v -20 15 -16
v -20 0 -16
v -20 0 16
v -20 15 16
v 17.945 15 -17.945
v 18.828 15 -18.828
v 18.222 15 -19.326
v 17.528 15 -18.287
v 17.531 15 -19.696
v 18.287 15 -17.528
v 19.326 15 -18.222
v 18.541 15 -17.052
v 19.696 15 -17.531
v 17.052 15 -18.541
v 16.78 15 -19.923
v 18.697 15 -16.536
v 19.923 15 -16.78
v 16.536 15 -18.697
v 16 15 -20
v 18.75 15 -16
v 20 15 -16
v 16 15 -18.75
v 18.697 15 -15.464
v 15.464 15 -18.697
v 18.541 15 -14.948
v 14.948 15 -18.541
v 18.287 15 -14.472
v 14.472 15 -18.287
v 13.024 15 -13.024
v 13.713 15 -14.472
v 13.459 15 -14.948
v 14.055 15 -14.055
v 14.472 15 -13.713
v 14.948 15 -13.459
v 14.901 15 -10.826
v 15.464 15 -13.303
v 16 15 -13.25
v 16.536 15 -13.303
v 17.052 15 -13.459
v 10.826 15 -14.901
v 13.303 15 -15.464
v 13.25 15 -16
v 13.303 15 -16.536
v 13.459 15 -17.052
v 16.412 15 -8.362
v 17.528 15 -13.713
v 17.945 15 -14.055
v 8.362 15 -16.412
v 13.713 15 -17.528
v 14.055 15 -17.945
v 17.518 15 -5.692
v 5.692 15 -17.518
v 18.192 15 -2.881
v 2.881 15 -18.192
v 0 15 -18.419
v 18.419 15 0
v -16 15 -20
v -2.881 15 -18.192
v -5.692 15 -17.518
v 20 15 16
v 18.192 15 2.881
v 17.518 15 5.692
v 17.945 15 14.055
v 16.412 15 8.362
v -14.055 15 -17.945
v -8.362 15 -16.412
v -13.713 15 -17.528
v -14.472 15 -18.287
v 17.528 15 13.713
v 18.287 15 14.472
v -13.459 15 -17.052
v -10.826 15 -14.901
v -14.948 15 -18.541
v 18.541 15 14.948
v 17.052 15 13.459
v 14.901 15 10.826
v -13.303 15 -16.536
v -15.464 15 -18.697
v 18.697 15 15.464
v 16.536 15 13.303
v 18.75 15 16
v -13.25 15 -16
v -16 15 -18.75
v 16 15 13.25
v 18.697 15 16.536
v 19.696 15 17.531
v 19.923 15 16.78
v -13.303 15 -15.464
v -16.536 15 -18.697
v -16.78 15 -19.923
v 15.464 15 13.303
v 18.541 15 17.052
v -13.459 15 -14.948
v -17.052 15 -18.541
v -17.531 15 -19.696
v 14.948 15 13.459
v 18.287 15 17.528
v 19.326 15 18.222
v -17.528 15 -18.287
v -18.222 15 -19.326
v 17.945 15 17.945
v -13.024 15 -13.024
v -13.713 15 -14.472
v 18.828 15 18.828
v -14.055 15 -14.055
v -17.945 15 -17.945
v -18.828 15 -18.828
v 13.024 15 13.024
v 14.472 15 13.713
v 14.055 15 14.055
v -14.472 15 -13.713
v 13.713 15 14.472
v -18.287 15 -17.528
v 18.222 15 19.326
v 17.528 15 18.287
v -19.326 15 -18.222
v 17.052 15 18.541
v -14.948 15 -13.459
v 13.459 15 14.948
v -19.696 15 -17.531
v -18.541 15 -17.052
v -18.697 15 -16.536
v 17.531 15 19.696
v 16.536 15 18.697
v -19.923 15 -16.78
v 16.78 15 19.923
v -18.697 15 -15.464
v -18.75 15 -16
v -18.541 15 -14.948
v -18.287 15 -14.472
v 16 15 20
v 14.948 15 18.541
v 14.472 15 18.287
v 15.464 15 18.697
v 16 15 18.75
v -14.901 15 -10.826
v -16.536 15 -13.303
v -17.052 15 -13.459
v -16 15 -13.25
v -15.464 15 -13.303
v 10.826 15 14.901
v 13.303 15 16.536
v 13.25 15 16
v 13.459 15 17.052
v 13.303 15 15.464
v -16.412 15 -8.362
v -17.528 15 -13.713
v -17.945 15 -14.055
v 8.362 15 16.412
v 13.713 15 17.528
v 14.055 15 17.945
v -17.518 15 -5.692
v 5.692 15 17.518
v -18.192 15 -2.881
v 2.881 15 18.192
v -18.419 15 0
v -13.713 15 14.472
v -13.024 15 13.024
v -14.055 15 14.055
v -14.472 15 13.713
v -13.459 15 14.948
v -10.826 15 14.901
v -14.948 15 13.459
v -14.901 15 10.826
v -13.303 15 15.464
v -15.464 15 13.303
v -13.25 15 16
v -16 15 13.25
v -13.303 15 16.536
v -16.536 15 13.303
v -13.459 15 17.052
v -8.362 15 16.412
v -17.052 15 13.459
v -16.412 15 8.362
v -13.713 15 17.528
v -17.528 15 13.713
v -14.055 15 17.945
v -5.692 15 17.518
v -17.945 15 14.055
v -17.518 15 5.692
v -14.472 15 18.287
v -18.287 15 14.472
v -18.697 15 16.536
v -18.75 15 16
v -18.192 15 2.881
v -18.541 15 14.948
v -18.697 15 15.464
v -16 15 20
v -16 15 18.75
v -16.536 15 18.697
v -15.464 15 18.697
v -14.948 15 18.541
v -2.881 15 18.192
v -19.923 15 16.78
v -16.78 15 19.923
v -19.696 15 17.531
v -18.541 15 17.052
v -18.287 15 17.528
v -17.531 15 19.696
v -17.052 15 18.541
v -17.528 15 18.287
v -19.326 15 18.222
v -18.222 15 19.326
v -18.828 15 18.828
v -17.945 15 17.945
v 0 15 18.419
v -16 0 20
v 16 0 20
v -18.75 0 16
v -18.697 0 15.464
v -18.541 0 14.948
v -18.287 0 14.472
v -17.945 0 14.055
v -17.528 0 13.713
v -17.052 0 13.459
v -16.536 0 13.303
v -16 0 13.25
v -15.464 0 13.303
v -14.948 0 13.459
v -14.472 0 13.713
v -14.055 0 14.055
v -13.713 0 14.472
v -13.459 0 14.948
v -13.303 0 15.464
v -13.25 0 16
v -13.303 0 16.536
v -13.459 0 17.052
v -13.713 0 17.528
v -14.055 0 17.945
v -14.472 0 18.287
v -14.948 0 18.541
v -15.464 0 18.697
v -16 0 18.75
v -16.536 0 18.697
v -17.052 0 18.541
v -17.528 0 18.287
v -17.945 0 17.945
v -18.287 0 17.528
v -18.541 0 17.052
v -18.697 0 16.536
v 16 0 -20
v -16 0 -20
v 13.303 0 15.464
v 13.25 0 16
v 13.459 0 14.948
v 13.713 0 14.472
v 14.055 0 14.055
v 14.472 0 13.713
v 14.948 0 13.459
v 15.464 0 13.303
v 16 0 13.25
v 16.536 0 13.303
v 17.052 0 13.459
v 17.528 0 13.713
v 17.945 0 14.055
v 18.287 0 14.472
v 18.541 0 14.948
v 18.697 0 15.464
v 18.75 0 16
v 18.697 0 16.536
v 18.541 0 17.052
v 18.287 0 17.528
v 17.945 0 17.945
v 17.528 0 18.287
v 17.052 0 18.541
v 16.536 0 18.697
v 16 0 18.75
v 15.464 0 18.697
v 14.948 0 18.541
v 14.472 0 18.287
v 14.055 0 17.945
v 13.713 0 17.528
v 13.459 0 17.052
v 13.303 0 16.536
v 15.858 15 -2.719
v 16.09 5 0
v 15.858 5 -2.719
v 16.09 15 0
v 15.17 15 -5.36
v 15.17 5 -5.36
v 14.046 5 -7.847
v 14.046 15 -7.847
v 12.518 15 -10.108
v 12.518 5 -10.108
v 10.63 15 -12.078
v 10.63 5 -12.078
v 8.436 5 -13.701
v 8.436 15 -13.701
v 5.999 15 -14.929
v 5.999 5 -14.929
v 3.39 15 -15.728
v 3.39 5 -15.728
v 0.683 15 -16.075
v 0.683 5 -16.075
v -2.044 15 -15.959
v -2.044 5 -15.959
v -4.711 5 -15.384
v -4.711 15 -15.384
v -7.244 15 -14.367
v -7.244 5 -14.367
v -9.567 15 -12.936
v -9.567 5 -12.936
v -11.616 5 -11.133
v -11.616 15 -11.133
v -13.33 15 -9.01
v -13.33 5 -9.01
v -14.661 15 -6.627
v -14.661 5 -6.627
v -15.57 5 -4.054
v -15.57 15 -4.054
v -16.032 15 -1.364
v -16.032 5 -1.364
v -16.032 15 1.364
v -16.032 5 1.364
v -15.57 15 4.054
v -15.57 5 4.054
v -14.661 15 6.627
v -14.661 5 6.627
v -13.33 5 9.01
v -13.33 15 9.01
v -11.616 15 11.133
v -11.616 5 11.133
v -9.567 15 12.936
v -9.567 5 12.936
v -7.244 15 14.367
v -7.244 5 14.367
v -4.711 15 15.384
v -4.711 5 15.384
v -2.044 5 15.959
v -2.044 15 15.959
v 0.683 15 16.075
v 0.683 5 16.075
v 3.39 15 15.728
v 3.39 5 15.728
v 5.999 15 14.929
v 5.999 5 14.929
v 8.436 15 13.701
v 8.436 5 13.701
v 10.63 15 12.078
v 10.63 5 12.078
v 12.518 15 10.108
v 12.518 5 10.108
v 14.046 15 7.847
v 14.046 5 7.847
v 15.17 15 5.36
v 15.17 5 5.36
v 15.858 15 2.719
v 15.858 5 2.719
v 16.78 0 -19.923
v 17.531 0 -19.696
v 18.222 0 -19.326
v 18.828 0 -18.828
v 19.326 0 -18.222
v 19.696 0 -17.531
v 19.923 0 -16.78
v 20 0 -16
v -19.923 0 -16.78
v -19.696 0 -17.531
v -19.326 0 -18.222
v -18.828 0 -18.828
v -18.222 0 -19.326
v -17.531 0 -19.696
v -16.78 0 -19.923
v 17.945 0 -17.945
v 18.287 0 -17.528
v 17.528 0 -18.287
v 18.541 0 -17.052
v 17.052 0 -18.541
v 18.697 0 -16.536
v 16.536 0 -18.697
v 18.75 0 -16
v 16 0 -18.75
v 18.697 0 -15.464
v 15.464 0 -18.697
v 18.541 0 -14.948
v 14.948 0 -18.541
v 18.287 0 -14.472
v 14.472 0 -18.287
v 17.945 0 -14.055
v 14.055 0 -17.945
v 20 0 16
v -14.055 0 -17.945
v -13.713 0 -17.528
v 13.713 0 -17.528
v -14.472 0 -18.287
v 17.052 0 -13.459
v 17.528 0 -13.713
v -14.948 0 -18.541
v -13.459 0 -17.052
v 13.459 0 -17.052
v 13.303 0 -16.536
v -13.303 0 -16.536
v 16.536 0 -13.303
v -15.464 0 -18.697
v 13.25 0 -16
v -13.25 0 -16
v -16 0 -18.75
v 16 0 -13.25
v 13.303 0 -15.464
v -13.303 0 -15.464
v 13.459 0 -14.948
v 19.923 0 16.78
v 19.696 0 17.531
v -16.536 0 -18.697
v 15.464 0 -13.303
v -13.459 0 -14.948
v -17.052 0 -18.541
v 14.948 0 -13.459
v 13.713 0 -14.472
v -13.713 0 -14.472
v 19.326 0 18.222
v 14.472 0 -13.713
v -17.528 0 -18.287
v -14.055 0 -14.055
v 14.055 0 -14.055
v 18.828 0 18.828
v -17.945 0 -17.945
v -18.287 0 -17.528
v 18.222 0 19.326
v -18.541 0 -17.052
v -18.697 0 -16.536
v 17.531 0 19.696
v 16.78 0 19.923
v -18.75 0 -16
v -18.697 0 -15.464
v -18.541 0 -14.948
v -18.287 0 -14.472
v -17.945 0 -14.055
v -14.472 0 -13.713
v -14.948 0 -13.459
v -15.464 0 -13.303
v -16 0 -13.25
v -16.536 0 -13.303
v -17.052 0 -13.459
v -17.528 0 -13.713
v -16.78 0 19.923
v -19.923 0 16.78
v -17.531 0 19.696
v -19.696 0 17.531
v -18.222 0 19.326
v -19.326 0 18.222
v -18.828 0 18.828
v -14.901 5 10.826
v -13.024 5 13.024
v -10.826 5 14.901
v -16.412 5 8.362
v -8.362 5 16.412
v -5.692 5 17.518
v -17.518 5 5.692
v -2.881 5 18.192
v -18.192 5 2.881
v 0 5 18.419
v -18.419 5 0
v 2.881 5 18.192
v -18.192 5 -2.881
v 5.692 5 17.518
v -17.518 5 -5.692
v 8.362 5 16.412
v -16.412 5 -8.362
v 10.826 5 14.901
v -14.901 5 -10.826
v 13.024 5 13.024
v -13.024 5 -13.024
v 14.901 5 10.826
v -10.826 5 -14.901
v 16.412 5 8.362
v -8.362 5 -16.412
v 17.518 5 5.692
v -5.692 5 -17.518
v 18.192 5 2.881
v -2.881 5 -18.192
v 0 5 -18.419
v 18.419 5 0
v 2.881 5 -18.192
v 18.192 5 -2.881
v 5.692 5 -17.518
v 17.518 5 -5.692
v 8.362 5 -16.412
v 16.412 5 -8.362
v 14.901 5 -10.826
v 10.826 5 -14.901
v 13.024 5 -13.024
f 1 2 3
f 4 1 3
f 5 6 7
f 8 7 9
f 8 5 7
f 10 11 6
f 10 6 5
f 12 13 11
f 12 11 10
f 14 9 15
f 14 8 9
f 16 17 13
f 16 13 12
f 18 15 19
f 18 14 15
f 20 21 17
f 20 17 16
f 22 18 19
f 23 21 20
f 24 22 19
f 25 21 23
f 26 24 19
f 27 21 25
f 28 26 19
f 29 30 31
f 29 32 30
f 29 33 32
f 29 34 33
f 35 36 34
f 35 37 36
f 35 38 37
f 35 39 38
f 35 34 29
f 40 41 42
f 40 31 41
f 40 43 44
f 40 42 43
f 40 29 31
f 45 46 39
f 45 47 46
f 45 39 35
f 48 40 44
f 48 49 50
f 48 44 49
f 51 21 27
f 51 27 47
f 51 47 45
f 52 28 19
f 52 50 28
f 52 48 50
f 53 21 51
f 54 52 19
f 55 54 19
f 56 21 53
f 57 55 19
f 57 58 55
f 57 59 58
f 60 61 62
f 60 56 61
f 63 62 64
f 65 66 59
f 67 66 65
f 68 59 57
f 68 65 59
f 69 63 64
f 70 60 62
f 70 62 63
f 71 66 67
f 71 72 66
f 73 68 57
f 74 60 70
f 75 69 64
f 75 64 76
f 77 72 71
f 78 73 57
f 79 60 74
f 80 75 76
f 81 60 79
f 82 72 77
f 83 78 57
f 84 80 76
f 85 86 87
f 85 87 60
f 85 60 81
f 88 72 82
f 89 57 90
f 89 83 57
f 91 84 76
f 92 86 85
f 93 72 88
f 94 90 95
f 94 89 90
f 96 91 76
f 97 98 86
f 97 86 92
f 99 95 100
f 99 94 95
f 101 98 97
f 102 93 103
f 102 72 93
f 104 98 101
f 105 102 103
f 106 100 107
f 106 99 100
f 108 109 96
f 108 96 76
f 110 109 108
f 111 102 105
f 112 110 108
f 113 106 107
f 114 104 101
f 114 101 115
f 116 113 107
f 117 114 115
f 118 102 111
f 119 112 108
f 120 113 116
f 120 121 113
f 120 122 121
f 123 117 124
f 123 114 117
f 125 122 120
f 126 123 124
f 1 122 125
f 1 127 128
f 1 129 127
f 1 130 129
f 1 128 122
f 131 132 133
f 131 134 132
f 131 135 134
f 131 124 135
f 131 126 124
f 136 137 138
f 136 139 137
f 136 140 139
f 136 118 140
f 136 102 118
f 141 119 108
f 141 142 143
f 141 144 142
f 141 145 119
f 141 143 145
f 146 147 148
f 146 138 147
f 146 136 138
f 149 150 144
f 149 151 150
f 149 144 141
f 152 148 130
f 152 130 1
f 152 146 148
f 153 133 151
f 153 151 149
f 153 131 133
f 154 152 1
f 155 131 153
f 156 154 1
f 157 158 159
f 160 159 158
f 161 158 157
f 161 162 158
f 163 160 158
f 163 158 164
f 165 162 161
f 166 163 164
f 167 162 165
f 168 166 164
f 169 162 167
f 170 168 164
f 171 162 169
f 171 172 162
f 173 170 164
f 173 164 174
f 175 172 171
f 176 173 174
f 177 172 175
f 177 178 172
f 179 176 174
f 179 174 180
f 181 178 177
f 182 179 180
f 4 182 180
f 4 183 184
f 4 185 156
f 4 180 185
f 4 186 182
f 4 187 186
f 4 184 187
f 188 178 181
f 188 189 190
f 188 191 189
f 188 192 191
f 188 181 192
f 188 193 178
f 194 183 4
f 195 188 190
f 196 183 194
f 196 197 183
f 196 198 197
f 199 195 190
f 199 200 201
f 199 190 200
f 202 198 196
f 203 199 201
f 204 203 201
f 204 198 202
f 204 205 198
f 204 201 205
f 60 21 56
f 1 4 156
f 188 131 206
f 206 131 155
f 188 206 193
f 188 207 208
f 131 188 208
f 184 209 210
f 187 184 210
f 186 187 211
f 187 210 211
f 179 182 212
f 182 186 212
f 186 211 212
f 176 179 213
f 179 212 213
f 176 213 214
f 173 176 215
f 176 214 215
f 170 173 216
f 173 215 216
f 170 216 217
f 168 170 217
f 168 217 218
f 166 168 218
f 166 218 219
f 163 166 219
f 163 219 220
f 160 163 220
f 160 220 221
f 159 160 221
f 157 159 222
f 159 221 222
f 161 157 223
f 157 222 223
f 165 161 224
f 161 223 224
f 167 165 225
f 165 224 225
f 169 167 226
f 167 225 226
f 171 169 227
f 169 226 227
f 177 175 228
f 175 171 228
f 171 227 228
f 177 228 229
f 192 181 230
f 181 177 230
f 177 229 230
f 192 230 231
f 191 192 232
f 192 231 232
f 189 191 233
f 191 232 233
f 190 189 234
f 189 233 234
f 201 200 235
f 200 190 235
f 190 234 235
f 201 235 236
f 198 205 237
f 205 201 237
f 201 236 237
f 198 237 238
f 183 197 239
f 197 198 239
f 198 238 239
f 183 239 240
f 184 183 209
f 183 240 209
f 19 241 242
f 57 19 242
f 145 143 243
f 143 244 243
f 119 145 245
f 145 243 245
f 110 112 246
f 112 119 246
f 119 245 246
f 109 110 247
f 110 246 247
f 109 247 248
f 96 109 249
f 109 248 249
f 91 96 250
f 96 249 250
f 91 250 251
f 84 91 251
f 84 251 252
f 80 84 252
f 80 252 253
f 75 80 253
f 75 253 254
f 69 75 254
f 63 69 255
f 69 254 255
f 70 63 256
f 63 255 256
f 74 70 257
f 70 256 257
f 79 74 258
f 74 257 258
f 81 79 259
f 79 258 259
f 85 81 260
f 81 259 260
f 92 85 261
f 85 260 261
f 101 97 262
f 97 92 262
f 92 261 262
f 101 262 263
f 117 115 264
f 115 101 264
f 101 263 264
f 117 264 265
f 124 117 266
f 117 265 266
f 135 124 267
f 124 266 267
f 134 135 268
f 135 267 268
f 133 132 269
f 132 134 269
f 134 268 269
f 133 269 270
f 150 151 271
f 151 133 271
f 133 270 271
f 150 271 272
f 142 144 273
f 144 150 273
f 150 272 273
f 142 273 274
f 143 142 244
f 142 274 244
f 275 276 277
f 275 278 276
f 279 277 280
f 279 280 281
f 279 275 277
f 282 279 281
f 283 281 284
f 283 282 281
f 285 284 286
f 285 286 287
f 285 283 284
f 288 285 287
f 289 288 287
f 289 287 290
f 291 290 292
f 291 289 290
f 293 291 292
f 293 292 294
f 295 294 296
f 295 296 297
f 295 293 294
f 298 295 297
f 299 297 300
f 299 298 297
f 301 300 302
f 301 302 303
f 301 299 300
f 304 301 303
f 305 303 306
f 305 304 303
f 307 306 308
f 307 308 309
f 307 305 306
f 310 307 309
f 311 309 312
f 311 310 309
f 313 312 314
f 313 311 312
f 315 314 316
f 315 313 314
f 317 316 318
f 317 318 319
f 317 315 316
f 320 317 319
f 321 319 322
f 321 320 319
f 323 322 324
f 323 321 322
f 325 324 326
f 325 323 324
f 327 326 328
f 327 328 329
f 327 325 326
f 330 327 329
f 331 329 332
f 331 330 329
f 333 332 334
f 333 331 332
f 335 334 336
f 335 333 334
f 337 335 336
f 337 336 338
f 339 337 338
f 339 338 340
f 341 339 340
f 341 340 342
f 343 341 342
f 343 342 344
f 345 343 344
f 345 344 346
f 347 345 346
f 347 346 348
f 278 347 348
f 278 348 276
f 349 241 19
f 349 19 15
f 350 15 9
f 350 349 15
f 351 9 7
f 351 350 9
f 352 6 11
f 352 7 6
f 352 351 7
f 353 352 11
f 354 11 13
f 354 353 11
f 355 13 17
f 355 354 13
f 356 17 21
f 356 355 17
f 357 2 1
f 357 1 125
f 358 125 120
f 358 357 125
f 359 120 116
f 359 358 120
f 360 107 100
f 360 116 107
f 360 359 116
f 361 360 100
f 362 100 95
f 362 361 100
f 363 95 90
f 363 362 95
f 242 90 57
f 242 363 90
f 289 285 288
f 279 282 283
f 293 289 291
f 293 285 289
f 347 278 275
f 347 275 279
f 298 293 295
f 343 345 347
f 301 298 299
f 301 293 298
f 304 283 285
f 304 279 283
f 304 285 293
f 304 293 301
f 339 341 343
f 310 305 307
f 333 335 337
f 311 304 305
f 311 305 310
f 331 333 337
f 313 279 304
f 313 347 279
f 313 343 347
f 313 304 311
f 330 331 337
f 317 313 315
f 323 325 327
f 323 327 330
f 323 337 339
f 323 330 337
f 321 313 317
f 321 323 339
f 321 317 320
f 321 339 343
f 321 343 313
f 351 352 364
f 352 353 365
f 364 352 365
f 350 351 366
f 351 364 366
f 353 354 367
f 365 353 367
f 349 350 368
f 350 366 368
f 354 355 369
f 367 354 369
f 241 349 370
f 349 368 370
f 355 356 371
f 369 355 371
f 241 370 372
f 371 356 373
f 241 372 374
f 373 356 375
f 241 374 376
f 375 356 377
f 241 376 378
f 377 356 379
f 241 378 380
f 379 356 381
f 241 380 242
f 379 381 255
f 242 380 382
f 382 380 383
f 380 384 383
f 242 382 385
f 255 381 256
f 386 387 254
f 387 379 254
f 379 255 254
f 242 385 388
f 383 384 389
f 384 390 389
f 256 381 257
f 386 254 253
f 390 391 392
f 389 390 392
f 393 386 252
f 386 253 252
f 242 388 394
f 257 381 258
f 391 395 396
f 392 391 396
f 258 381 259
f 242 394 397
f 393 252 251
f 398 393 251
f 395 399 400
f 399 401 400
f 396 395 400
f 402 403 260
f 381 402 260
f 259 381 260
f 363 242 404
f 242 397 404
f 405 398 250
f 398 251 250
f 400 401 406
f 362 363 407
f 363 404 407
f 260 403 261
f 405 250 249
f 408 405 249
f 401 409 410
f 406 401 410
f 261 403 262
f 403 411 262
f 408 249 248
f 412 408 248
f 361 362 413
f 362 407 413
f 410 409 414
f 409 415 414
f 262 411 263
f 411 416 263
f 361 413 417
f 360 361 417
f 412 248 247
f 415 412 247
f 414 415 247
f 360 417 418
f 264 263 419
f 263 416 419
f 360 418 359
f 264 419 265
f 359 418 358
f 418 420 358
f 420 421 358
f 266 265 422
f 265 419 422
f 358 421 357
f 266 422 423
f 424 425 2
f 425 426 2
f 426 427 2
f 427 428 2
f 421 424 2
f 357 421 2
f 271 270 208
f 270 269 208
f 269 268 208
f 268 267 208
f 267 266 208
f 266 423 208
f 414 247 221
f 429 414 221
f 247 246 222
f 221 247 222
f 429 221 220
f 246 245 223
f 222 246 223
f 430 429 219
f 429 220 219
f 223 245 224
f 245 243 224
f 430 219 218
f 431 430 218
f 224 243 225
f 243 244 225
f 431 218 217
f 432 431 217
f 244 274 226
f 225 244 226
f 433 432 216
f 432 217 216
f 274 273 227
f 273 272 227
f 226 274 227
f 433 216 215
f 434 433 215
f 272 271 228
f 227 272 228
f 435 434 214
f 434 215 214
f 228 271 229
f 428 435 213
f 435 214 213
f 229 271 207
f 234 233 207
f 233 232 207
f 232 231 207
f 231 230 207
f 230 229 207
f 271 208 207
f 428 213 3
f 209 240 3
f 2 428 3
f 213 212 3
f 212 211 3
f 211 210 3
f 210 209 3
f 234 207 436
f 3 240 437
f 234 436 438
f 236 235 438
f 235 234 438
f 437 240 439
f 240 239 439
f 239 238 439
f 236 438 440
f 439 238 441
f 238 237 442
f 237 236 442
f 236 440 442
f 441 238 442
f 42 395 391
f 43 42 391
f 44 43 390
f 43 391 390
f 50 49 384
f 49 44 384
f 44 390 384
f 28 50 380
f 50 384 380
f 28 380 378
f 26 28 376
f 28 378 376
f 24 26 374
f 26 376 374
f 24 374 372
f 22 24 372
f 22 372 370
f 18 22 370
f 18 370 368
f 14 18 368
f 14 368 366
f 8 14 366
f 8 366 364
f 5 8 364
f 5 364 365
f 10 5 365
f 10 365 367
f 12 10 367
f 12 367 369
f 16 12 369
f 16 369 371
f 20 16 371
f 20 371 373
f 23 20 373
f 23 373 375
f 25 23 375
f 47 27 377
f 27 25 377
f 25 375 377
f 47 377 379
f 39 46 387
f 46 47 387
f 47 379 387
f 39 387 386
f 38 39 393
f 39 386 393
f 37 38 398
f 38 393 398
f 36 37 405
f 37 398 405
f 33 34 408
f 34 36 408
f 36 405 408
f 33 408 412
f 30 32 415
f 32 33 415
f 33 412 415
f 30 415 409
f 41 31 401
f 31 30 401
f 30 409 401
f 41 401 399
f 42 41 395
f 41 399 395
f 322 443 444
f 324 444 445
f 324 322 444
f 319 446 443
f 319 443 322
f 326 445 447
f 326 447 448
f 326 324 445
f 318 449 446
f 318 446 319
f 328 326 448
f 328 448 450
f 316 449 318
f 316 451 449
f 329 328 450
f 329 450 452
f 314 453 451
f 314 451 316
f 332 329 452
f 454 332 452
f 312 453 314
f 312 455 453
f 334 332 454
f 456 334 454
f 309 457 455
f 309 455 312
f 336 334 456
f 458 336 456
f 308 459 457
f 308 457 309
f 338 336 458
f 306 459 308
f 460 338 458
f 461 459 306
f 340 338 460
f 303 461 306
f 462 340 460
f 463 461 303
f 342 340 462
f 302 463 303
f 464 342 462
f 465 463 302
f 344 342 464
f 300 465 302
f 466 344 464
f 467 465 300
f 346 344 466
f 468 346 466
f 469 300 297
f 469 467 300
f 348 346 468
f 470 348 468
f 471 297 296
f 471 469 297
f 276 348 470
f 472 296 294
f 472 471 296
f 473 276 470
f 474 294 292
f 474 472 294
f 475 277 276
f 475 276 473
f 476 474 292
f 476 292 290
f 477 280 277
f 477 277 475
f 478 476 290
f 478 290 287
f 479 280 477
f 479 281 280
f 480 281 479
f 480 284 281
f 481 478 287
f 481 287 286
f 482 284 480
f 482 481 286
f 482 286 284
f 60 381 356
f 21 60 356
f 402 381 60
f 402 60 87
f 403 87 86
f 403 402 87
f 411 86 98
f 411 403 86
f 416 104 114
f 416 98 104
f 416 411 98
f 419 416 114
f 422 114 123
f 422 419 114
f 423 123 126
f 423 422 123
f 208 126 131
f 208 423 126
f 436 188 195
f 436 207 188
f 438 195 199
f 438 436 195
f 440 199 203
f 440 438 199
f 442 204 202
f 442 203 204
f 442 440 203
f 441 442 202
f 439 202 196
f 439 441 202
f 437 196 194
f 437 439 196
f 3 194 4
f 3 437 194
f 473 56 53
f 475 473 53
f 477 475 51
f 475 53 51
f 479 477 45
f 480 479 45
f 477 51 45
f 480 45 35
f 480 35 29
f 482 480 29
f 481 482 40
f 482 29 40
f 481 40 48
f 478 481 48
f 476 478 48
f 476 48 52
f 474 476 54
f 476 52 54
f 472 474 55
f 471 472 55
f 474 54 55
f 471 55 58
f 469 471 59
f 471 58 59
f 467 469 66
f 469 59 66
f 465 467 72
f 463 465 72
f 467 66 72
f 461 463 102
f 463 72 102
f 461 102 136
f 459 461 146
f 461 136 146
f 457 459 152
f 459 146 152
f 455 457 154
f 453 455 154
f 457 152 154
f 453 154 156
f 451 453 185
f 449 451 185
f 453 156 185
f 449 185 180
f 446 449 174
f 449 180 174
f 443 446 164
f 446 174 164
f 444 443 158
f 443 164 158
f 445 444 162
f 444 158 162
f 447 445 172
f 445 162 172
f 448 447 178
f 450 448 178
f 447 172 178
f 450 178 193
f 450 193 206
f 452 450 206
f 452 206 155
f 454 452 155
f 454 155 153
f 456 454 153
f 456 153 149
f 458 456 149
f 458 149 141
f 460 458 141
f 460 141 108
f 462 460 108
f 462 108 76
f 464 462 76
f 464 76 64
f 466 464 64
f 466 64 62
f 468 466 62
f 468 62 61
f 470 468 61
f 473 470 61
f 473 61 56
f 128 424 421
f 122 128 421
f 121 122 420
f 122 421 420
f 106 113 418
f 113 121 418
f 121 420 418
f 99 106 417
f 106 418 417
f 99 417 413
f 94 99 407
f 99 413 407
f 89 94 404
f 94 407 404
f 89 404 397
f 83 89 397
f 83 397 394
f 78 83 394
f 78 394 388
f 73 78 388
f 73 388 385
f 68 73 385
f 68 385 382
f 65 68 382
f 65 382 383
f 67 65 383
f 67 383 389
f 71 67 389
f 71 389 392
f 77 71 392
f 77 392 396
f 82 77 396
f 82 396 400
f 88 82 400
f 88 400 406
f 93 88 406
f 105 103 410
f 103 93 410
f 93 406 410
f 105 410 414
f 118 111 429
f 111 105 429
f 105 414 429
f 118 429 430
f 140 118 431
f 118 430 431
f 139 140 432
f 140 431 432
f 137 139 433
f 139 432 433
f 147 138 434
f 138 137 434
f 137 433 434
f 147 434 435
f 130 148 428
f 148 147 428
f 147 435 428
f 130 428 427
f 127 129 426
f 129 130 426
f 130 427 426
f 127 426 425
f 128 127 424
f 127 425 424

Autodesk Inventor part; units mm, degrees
ref_plane "YZ Plane" through (0, 0, 0) normal (1, 0, 0) x (0, 1, 0)
ref_plane "XZ Plane" through (0, 0, 0) normal (0, 1, 0) x (-1, 0, 0)
ref_plane "XY Plane" through (0, 0, 0) normal (0, 0, 1) x (1, 0, 0)
sketch "Sketch1" plane through (0, 0, 0) normal (0, 1, 0) x (-1, 0, 0)
  line L0 (16, 20) -> (-16, 20)
  line L1 (-20, 16) -> (-20, -16)
  line L2 (-16, -20) -> (16, -20)
  line L3 (20, -16) -> (20, 16)
  arc A0 (16, -20) -> (20, -16) centre (16, -16) ccw
  arc A1 (-20, -16) -> (-16, -20) centre (-16, -16) ccw
  arc A2 (20, 16) -> (16, 20) centre (16, 16) ccw
  arc A3 (-16, 20) -> (-20, 16) centre (-16, 16) ccw
  circle A4 centre (16, -16) radius 2.75
  circle A5 centre (-16, -16) radius 2.75
  circle A6 centre (16, 16) radius 2.75
  circle A7 centre (-16, 16) radius 2.75
  point P0 (0, 0)
  point P1 (-20, -20)
  point P2 (20, -20)
  point P3 (0, -20)
  point P4 (20, 0)
  dimension "d1" = 40
  dimension "d17" = 5.5
  dimension "d22" = 32
extrude "Extrusion1" add sketch "Sketch1" along normal blind 15
sketch "Sketch2" plane through (0, 15, 0) normal (0, 1, 0) x (1, 0, 0)
  circle A0 centre (0, 0) radius 18.4191
  circle A1 centre (0, 0) radius 16.0895
extrude "Extrusion2" cut sketch "Sketch2" against normal blind 10
properties part number "Fan" material "ABS Plastic"
